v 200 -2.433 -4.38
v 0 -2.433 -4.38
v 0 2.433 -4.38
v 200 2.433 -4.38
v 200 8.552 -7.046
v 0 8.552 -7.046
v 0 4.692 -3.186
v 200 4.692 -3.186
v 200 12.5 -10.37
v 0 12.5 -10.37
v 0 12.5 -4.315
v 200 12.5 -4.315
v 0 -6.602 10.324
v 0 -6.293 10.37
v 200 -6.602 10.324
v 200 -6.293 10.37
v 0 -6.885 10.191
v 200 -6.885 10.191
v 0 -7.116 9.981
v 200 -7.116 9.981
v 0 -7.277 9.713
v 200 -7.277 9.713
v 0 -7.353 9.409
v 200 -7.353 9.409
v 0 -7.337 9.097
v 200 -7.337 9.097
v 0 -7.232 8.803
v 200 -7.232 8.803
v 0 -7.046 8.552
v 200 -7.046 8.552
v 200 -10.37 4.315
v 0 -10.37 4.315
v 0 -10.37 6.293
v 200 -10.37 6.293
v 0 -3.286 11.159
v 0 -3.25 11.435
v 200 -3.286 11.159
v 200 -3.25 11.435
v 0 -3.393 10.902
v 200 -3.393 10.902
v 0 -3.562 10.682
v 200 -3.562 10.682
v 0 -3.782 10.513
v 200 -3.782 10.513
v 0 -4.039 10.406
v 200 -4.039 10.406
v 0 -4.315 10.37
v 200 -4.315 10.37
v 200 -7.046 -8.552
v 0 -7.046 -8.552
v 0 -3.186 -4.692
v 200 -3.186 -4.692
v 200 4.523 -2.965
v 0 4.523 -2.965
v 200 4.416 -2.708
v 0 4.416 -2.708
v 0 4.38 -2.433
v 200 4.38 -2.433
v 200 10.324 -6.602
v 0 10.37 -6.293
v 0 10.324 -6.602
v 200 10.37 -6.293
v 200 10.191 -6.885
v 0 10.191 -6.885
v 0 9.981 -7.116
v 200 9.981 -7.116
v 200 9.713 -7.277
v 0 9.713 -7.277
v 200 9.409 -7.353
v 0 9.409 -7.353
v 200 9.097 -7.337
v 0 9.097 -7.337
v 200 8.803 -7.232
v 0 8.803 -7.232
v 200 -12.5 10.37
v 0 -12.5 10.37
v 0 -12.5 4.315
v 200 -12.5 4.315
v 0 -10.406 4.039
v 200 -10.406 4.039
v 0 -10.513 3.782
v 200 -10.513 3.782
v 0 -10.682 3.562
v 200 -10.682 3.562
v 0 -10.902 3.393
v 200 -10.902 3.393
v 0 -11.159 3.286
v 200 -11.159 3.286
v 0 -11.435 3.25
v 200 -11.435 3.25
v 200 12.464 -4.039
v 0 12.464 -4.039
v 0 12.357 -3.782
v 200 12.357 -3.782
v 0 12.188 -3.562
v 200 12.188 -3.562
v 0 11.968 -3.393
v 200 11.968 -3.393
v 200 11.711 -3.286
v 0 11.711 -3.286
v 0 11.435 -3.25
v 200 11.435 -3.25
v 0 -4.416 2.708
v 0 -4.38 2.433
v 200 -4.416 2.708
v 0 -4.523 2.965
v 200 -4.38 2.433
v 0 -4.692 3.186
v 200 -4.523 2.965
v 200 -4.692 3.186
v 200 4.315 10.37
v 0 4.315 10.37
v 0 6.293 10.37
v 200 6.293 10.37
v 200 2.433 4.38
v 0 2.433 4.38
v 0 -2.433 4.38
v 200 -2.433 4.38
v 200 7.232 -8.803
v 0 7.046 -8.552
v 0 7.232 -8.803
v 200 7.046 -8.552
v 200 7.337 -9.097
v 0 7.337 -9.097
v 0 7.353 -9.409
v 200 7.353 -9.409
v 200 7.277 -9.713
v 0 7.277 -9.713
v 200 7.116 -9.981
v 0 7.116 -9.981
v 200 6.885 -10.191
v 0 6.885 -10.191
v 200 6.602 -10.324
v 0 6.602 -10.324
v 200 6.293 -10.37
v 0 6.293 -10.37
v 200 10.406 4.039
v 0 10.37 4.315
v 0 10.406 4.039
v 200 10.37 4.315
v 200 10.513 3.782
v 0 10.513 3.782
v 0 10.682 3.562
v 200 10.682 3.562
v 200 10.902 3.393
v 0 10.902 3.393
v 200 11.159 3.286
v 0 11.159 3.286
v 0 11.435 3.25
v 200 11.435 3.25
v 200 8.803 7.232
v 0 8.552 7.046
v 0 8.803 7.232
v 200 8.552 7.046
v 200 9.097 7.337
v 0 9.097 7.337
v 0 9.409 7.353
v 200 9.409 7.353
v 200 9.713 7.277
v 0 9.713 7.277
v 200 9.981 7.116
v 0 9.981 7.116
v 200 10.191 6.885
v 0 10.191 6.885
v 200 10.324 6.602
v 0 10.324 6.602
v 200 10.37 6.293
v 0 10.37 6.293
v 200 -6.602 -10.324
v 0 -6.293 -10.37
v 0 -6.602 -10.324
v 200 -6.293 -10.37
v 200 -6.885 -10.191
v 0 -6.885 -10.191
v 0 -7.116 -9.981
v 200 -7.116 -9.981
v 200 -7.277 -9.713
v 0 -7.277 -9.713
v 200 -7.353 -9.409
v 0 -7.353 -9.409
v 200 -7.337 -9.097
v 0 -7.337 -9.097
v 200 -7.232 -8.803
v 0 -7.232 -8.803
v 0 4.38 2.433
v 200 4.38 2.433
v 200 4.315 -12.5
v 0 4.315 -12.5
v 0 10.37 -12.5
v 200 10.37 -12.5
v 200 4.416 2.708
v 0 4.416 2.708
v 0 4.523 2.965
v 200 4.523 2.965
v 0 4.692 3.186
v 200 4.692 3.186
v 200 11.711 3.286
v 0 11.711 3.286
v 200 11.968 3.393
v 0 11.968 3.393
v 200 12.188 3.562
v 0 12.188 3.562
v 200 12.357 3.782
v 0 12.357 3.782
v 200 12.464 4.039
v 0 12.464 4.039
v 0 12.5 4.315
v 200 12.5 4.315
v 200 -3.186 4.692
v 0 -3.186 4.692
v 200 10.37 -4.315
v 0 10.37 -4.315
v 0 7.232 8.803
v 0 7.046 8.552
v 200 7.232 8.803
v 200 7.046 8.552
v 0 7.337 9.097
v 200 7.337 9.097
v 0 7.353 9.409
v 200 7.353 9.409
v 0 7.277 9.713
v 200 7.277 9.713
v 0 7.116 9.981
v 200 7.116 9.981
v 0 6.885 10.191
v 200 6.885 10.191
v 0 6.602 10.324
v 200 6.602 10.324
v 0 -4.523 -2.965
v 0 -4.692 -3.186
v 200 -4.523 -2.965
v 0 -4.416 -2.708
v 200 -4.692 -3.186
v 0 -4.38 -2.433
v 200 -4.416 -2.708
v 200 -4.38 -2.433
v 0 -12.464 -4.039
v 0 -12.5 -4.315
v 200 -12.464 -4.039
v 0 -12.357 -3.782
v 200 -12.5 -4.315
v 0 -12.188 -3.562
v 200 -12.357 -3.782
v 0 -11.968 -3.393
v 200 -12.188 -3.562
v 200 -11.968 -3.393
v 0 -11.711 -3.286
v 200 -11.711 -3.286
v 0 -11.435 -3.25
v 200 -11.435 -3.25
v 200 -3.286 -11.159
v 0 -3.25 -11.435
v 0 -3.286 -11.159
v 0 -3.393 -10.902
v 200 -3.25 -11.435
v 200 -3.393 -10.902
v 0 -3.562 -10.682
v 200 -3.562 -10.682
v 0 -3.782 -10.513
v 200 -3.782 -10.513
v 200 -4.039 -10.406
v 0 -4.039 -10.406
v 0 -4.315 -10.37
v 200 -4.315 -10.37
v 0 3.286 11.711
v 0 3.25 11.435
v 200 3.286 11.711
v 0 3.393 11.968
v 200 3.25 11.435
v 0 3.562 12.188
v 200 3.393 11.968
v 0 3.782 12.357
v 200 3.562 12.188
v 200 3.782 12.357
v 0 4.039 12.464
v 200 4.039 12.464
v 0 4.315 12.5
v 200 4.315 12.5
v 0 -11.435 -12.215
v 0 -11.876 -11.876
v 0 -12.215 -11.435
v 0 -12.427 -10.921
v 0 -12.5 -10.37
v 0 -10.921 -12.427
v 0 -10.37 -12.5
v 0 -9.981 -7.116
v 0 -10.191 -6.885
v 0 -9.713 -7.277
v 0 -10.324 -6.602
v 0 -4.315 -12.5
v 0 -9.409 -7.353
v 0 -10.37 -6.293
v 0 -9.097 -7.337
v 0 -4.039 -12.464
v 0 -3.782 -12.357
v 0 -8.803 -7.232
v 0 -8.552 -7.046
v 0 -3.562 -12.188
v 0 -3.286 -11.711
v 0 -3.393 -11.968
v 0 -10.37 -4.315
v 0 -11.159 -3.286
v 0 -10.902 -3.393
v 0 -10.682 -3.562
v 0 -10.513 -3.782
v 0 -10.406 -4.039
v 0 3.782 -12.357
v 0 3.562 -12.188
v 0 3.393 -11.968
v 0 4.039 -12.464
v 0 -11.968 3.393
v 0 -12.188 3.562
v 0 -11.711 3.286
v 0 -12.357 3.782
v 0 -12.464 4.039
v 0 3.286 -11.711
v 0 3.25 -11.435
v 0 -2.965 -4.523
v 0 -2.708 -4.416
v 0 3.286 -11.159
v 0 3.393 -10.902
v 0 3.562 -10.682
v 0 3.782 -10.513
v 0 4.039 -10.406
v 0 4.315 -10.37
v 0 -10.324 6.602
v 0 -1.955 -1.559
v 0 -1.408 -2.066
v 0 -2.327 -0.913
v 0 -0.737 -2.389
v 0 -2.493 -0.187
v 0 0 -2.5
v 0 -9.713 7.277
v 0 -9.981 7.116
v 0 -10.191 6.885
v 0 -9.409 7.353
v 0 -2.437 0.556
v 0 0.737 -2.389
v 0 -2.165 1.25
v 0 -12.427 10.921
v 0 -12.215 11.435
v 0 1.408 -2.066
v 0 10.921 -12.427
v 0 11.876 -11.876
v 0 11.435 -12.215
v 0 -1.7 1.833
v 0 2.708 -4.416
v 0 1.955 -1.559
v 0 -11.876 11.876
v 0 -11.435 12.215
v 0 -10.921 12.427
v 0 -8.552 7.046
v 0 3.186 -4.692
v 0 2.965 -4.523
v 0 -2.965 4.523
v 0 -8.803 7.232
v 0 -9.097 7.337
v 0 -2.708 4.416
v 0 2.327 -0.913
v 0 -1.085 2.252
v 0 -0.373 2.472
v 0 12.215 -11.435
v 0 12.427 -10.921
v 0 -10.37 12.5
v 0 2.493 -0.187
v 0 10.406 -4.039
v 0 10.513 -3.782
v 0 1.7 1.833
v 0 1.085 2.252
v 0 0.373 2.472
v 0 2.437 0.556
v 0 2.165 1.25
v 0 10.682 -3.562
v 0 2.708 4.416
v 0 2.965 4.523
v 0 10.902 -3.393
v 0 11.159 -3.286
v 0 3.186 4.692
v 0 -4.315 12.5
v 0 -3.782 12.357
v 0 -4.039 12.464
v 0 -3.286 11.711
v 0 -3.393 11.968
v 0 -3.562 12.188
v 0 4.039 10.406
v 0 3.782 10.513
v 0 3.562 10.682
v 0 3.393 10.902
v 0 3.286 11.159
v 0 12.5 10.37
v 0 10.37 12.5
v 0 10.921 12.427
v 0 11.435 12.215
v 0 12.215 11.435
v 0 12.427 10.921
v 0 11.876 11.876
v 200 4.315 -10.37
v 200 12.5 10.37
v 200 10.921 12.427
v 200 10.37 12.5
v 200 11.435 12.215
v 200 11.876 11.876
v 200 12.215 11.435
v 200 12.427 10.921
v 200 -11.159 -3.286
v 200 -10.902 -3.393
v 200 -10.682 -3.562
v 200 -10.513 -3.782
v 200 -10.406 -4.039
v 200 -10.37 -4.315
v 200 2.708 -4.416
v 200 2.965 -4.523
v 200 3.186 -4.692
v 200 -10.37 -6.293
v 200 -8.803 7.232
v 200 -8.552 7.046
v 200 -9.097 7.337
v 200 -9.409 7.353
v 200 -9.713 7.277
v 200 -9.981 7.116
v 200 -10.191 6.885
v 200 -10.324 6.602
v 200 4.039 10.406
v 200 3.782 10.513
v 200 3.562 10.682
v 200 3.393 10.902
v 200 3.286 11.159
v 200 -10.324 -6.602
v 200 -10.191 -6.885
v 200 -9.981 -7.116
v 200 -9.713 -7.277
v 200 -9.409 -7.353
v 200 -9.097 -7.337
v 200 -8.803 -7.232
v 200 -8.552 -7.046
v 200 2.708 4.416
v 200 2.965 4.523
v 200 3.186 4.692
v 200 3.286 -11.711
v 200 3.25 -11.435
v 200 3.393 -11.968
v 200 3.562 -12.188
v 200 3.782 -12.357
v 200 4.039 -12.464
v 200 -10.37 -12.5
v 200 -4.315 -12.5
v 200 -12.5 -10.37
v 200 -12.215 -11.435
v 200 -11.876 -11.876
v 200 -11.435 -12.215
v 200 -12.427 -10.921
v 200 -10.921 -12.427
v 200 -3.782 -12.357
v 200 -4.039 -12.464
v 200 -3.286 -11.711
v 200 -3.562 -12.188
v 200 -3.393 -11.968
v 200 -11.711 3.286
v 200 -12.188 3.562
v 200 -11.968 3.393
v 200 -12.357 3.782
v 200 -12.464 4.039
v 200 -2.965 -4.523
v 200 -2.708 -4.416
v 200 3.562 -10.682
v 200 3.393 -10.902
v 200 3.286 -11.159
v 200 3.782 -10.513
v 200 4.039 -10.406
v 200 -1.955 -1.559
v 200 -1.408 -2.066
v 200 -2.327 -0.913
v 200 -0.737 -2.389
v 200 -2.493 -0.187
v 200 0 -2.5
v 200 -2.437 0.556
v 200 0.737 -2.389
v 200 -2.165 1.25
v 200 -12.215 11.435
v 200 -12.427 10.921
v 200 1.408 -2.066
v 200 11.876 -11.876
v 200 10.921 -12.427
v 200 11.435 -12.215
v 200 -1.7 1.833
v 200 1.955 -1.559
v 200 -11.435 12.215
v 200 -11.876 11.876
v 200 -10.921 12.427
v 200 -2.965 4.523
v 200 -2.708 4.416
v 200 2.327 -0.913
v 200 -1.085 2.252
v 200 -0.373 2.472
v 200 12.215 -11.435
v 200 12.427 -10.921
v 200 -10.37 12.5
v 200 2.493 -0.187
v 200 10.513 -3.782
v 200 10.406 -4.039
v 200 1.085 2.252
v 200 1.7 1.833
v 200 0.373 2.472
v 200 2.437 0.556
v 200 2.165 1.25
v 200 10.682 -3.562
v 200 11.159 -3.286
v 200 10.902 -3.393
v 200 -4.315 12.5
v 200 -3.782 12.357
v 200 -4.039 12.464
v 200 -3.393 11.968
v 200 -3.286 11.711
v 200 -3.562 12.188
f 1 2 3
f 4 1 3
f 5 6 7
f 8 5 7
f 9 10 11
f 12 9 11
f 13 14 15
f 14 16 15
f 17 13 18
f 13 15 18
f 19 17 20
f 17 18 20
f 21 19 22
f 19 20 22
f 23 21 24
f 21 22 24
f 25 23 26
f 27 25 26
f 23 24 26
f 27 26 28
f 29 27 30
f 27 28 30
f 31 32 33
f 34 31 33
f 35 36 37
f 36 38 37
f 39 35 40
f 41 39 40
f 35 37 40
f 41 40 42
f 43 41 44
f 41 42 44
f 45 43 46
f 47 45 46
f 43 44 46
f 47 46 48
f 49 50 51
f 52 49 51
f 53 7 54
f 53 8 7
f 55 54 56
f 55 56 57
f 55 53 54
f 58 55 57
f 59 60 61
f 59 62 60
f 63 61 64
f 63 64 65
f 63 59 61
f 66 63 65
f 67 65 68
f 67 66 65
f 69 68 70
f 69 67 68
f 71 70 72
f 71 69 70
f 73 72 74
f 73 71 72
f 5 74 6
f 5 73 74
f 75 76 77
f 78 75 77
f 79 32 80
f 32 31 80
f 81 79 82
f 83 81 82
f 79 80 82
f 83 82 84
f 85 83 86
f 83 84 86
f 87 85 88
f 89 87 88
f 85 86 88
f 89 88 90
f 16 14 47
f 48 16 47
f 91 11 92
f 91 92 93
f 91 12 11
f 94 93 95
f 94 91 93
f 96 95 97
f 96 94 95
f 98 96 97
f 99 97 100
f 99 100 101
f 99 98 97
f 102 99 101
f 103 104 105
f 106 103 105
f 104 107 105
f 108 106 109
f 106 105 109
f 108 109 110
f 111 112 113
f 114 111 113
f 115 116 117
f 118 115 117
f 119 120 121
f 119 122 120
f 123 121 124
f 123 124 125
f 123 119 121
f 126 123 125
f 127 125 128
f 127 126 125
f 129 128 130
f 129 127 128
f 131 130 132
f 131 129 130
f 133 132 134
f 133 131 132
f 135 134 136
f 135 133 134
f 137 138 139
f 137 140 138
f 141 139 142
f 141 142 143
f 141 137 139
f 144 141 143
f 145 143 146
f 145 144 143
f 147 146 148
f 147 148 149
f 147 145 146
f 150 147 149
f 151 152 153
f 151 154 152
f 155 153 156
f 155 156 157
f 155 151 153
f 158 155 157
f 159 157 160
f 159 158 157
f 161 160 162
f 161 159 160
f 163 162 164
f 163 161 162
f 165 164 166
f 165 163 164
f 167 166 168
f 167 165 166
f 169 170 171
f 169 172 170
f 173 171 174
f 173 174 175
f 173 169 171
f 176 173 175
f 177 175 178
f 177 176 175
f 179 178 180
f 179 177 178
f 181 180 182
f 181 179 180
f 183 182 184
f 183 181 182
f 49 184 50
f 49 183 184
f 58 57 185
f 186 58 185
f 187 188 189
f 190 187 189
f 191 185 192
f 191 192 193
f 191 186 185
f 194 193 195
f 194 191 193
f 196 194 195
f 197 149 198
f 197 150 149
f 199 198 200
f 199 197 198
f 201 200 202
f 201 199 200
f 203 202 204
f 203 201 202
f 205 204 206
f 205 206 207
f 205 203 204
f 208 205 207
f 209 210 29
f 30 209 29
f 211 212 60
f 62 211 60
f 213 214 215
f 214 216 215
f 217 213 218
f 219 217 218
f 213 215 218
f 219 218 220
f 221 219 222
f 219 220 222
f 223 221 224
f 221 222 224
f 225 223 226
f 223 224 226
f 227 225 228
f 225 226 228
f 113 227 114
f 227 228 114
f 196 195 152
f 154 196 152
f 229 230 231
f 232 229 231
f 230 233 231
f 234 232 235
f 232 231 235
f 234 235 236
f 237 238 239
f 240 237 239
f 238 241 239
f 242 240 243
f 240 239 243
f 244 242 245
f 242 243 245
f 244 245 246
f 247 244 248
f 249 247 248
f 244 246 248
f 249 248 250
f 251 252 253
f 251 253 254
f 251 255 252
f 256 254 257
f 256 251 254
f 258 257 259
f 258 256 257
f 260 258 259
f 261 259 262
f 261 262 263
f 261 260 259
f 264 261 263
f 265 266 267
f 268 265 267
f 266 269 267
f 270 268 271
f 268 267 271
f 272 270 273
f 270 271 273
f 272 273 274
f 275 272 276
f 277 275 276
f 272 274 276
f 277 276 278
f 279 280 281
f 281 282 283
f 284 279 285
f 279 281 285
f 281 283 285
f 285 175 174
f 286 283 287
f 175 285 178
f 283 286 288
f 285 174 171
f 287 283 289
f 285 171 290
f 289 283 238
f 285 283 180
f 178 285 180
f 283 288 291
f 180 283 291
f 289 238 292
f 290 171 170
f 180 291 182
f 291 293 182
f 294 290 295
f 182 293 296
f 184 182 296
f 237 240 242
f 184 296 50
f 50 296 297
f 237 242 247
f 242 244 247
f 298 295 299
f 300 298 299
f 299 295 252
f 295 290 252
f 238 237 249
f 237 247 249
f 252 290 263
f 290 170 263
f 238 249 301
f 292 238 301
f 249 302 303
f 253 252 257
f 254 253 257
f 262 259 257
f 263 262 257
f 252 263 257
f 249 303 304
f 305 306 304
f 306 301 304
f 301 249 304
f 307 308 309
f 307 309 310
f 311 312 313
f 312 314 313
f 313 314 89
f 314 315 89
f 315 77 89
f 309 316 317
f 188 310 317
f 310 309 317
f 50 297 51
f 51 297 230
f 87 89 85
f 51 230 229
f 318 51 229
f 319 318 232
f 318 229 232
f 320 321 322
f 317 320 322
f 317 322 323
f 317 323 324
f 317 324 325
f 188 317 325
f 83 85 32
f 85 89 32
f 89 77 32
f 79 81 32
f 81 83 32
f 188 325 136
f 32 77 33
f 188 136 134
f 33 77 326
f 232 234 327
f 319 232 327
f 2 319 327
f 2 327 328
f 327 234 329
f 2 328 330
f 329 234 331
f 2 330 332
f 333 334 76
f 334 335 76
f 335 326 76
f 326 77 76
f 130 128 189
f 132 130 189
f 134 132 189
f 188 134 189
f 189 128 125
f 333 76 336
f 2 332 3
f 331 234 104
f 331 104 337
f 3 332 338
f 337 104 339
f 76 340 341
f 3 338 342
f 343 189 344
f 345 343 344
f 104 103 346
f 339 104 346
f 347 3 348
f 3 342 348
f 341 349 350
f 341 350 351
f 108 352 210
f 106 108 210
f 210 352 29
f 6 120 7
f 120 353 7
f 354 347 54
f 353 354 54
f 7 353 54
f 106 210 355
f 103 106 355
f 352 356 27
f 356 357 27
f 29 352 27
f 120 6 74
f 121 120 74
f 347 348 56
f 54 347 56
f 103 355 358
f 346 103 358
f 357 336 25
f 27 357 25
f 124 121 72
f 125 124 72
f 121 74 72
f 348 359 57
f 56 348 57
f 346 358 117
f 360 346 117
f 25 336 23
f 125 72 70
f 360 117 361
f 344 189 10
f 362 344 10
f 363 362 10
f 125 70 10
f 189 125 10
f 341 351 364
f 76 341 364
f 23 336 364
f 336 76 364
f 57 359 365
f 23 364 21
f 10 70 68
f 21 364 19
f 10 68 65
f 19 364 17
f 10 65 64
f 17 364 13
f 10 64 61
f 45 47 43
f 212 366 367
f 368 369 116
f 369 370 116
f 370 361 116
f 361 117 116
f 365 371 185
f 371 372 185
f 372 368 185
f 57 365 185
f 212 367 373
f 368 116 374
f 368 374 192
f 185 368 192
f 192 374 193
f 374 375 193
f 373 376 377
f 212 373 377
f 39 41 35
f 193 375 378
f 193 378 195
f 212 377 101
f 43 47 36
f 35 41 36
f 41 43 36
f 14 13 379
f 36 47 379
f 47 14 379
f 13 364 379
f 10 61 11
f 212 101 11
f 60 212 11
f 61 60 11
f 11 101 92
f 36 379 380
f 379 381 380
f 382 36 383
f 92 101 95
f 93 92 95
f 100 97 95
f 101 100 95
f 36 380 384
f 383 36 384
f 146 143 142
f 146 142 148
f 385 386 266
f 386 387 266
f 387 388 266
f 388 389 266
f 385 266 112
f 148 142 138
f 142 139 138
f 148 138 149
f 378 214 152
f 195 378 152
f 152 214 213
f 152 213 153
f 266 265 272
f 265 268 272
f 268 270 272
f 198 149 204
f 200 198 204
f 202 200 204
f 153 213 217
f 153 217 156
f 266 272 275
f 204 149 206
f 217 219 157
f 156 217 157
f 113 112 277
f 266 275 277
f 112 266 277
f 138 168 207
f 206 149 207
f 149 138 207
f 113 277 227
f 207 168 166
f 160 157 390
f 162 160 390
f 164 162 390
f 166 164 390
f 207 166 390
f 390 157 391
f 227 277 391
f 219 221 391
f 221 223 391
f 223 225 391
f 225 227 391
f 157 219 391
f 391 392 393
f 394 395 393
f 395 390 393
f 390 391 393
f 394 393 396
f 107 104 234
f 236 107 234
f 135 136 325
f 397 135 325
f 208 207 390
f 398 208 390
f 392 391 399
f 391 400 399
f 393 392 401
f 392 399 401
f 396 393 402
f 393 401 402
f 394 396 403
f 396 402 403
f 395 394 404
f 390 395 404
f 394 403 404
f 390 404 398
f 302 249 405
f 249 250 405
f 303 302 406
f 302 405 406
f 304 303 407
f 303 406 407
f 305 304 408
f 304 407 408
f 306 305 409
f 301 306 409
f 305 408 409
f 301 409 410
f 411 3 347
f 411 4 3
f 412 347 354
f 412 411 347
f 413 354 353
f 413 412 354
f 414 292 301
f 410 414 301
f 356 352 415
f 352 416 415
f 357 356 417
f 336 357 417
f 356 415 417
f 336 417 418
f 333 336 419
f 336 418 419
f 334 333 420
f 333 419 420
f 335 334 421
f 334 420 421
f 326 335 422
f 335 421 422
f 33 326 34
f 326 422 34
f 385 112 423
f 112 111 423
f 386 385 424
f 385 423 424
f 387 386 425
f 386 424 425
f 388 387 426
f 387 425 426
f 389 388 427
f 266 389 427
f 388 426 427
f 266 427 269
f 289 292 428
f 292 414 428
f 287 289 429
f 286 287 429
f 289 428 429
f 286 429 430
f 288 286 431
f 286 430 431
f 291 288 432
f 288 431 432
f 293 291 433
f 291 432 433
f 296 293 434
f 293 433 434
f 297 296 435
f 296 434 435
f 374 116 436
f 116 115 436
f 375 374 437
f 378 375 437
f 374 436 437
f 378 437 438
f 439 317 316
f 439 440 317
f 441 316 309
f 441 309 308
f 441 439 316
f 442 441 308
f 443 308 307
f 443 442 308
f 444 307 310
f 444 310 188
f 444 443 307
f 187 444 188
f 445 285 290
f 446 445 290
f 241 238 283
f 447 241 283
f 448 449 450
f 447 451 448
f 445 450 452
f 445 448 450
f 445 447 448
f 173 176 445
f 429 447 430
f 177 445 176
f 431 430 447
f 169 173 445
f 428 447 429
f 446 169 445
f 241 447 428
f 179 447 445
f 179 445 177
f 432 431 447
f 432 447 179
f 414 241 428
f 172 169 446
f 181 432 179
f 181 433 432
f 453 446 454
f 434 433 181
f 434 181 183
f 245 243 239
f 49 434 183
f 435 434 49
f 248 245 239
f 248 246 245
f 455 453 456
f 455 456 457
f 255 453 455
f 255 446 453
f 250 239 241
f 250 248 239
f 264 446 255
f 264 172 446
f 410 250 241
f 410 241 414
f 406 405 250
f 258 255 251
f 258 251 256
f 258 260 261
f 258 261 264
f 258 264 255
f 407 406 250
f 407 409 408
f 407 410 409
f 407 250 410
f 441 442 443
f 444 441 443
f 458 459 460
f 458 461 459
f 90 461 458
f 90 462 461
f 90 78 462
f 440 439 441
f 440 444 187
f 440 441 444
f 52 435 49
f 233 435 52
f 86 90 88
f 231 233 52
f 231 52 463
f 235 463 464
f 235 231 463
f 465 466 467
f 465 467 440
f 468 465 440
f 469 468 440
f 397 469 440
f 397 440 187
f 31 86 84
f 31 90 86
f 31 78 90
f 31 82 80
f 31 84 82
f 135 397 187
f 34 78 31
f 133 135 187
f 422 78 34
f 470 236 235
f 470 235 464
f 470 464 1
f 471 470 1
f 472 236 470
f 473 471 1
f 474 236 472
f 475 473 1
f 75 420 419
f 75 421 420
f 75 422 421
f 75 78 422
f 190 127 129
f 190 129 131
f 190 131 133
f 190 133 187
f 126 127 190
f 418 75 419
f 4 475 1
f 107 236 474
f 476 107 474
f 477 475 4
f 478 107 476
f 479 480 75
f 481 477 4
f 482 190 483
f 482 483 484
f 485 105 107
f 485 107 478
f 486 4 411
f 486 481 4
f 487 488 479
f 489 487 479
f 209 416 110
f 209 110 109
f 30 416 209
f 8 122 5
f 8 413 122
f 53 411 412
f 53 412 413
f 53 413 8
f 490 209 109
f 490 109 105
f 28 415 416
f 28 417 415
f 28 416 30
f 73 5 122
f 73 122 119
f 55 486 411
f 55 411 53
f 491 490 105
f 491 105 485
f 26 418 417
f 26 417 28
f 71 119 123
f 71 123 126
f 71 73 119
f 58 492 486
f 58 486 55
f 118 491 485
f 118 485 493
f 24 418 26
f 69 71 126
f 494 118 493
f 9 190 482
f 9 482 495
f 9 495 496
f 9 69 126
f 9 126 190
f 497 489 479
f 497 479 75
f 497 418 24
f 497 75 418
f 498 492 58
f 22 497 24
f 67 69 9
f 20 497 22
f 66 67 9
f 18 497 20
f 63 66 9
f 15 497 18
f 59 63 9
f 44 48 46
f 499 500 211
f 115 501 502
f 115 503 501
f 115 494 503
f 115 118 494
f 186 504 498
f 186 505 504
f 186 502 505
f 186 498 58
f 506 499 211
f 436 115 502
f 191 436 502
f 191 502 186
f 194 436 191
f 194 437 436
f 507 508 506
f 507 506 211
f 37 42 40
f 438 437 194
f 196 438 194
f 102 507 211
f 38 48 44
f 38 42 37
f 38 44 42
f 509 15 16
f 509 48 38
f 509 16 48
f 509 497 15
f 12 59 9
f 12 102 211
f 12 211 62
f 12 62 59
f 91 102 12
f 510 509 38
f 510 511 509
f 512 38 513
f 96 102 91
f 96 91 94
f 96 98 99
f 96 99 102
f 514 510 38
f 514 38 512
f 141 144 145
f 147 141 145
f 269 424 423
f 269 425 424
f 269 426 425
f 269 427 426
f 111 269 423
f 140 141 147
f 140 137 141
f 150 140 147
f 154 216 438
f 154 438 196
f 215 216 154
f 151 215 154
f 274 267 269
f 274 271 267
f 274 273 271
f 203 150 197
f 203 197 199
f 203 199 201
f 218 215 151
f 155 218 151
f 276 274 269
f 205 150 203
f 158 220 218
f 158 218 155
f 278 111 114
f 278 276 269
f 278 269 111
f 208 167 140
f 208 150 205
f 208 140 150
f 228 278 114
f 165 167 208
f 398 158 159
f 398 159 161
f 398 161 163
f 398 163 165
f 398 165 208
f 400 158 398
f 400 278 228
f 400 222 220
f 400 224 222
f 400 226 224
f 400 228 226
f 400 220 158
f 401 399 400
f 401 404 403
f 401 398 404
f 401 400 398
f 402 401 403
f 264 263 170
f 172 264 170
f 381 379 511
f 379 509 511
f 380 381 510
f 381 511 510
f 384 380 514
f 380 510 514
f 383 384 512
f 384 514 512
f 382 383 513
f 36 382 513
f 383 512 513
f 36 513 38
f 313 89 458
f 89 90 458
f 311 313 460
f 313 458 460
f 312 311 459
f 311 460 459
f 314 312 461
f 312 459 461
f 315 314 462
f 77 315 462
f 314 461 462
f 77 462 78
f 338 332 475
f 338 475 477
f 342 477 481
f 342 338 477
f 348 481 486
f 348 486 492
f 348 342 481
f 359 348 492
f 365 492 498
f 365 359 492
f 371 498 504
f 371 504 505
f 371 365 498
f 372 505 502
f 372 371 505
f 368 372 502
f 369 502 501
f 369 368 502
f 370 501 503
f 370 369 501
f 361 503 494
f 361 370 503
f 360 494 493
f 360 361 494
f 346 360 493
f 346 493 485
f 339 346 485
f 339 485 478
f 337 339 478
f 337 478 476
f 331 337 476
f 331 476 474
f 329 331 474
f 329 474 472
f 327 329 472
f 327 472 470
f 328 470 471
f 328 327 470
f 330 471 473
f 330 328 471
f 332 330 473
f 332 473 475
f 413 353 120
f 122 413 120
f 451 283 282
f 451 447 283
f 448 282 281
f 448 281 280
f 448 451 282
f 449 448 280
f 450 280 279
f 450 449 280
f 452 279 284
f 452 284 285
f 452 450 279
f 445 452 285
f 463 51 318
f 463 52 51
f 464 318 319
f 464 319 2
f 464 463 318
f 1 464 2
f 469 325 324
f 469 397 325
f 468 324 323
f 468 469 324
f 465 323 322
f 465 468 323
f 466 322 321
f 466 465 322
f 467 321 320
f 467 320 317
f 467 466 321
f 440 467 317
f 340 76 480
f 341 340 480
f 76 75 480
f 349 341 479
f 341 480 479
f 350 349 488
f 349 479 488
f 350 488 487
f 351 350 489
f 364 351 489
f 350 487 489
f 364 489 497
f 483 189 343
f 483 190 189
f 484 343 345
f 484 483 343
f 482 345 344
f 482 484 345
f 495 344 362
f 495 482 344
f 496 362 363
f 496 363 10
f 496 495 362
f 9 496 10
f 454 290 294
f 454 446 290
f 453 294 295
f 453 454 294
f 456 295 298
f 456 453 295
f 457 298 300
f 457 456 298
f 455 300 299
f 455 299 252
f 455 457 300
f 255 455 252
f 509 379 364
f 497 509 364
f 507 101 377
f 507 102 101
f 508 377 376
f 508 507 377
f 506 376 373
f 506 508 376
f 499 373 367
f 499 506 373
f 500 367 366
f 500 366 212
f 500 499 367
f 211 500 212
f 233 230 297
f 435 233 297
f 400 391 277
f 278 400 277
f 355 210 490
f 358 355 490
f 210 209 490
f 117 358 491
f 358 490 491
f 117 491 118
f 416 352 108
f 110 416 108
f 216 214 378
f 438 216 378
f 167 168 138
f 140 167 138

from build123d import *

# Parameters (mm, degrees)
SKETCH1_R           = 2.5
BOSS_EXTRUDE1_DEPTH = 200
FILLET1_R           = 1.065
FILLET2_R           = 2.13


with BuildPart() as part:
    # Sketch1 → Boss-Extrude1 (new body)
    with BuildSketch(Plane.YZ):
        Polygon((-12.5, -3.25), (-12.5, -12.5), (-3.25, -12.5), (-3.25, -10.37), (-8.863862556, -10.37), (-2.873862556, -4.38), (2.873862556, -4.38), (8.863862556, -10.37), (3.25, -10.37), (3.25, -12.5), (12.5, -12.5), (12.5, -3.25), (10.37, -3.25), (10.37, -8.863862556), (4.38, -2.873862556), (4.38, 2.873862556), (10.37, 8.863862556), (10.37, 3.25), (12.5, 3.25), (12.5, 12.5), (3.25, 12.5), (3.25, 10.37), (8.863862556, 10.37), (2.873862556, 4.38), (-2.873862556, 4.38), (-8.863862556, 10.37), (-3.25, 10.37), (-3.25, 12.5), (-12.5, 12.5), (-12.5, 3.25), (-10.37, 3.25), (-10.37, 8.863862556), (-4.38, 2.873862556), (-4.38, -2.873862556), (-10.37, -8.863862556), (-10.37, -3.25), align=None)
        with Locations(Location((0, 0, 0), (0, 0, 270))):
            Circle(SKETCH1_R, mode=Mode.SUBTRACT)
    extrude(amount=BOSS_EXTRUDE1_DEPTH)

    # Fillet1
    fillet1_edges = [part.edges().sort_by_distance(p)[0] for p in [
        (100, -10.37, -8.863862556),
        (100, 2.873862556, -4.38),
        (100, -2.873862556, -4.38),
        (100, -4.38, 2.873862556),
        (100, -4.38, -2.873862556),
        (100, -2.873862556, 4.38),
        (100, 2.873862556, 4.38),
        (100, 4.38, 2.873862556),
        (100, 4.38, -2.873862556),
        (100, -8.863862556, -10.37),
        (100, 8.863862556, -10.37),
        (100, 10.37, -8.863862556),
        (100, -10.37, 8.863862556),
        (100, -8.863862556, 10.37),
        (100, 10.37, 8.863862556),
        (100, 8.863862556, 10.37),
        (100, 12.5, 3.25),
        (100, -3.25, -12.5),
        (100, -10.37, 3.25),
        (100, 10.37, 3.25),
        (100, -10.37, -3.25),
        (100, -12.5, -3.25),
        (100, -12.5, 3.25),
        (100, 3.25, -10.37),
        (100, -3.25, -10.37),
        (100, 3.25, -12.5),
        (100, 10.37, -3.25),
        (100, 12.5, -3.25),
        (100, 3.25, 12.5),
        (100, 3.25, 10.37),
        (100, -3.25, 10.37),
        (100, -3.25, 12.5),
    ]]
    fillet(fillet1_edges, radius=FILLET1_R - 0.0001)  # a hair under: the kernel refuses the full size

    # Fillet2
    fillet2_edges = [part.edges().sort_by_distance(p)[0] for p in [
        (100, -12.5, 12.5),
        (100, 12.5, 12.5),
        (100, 12.5, -12.5),
        (100, -12.5, -12.5),
    ]]
    fillet(fillet2_edges, radius=FILLET2_R)


solid = part.part
